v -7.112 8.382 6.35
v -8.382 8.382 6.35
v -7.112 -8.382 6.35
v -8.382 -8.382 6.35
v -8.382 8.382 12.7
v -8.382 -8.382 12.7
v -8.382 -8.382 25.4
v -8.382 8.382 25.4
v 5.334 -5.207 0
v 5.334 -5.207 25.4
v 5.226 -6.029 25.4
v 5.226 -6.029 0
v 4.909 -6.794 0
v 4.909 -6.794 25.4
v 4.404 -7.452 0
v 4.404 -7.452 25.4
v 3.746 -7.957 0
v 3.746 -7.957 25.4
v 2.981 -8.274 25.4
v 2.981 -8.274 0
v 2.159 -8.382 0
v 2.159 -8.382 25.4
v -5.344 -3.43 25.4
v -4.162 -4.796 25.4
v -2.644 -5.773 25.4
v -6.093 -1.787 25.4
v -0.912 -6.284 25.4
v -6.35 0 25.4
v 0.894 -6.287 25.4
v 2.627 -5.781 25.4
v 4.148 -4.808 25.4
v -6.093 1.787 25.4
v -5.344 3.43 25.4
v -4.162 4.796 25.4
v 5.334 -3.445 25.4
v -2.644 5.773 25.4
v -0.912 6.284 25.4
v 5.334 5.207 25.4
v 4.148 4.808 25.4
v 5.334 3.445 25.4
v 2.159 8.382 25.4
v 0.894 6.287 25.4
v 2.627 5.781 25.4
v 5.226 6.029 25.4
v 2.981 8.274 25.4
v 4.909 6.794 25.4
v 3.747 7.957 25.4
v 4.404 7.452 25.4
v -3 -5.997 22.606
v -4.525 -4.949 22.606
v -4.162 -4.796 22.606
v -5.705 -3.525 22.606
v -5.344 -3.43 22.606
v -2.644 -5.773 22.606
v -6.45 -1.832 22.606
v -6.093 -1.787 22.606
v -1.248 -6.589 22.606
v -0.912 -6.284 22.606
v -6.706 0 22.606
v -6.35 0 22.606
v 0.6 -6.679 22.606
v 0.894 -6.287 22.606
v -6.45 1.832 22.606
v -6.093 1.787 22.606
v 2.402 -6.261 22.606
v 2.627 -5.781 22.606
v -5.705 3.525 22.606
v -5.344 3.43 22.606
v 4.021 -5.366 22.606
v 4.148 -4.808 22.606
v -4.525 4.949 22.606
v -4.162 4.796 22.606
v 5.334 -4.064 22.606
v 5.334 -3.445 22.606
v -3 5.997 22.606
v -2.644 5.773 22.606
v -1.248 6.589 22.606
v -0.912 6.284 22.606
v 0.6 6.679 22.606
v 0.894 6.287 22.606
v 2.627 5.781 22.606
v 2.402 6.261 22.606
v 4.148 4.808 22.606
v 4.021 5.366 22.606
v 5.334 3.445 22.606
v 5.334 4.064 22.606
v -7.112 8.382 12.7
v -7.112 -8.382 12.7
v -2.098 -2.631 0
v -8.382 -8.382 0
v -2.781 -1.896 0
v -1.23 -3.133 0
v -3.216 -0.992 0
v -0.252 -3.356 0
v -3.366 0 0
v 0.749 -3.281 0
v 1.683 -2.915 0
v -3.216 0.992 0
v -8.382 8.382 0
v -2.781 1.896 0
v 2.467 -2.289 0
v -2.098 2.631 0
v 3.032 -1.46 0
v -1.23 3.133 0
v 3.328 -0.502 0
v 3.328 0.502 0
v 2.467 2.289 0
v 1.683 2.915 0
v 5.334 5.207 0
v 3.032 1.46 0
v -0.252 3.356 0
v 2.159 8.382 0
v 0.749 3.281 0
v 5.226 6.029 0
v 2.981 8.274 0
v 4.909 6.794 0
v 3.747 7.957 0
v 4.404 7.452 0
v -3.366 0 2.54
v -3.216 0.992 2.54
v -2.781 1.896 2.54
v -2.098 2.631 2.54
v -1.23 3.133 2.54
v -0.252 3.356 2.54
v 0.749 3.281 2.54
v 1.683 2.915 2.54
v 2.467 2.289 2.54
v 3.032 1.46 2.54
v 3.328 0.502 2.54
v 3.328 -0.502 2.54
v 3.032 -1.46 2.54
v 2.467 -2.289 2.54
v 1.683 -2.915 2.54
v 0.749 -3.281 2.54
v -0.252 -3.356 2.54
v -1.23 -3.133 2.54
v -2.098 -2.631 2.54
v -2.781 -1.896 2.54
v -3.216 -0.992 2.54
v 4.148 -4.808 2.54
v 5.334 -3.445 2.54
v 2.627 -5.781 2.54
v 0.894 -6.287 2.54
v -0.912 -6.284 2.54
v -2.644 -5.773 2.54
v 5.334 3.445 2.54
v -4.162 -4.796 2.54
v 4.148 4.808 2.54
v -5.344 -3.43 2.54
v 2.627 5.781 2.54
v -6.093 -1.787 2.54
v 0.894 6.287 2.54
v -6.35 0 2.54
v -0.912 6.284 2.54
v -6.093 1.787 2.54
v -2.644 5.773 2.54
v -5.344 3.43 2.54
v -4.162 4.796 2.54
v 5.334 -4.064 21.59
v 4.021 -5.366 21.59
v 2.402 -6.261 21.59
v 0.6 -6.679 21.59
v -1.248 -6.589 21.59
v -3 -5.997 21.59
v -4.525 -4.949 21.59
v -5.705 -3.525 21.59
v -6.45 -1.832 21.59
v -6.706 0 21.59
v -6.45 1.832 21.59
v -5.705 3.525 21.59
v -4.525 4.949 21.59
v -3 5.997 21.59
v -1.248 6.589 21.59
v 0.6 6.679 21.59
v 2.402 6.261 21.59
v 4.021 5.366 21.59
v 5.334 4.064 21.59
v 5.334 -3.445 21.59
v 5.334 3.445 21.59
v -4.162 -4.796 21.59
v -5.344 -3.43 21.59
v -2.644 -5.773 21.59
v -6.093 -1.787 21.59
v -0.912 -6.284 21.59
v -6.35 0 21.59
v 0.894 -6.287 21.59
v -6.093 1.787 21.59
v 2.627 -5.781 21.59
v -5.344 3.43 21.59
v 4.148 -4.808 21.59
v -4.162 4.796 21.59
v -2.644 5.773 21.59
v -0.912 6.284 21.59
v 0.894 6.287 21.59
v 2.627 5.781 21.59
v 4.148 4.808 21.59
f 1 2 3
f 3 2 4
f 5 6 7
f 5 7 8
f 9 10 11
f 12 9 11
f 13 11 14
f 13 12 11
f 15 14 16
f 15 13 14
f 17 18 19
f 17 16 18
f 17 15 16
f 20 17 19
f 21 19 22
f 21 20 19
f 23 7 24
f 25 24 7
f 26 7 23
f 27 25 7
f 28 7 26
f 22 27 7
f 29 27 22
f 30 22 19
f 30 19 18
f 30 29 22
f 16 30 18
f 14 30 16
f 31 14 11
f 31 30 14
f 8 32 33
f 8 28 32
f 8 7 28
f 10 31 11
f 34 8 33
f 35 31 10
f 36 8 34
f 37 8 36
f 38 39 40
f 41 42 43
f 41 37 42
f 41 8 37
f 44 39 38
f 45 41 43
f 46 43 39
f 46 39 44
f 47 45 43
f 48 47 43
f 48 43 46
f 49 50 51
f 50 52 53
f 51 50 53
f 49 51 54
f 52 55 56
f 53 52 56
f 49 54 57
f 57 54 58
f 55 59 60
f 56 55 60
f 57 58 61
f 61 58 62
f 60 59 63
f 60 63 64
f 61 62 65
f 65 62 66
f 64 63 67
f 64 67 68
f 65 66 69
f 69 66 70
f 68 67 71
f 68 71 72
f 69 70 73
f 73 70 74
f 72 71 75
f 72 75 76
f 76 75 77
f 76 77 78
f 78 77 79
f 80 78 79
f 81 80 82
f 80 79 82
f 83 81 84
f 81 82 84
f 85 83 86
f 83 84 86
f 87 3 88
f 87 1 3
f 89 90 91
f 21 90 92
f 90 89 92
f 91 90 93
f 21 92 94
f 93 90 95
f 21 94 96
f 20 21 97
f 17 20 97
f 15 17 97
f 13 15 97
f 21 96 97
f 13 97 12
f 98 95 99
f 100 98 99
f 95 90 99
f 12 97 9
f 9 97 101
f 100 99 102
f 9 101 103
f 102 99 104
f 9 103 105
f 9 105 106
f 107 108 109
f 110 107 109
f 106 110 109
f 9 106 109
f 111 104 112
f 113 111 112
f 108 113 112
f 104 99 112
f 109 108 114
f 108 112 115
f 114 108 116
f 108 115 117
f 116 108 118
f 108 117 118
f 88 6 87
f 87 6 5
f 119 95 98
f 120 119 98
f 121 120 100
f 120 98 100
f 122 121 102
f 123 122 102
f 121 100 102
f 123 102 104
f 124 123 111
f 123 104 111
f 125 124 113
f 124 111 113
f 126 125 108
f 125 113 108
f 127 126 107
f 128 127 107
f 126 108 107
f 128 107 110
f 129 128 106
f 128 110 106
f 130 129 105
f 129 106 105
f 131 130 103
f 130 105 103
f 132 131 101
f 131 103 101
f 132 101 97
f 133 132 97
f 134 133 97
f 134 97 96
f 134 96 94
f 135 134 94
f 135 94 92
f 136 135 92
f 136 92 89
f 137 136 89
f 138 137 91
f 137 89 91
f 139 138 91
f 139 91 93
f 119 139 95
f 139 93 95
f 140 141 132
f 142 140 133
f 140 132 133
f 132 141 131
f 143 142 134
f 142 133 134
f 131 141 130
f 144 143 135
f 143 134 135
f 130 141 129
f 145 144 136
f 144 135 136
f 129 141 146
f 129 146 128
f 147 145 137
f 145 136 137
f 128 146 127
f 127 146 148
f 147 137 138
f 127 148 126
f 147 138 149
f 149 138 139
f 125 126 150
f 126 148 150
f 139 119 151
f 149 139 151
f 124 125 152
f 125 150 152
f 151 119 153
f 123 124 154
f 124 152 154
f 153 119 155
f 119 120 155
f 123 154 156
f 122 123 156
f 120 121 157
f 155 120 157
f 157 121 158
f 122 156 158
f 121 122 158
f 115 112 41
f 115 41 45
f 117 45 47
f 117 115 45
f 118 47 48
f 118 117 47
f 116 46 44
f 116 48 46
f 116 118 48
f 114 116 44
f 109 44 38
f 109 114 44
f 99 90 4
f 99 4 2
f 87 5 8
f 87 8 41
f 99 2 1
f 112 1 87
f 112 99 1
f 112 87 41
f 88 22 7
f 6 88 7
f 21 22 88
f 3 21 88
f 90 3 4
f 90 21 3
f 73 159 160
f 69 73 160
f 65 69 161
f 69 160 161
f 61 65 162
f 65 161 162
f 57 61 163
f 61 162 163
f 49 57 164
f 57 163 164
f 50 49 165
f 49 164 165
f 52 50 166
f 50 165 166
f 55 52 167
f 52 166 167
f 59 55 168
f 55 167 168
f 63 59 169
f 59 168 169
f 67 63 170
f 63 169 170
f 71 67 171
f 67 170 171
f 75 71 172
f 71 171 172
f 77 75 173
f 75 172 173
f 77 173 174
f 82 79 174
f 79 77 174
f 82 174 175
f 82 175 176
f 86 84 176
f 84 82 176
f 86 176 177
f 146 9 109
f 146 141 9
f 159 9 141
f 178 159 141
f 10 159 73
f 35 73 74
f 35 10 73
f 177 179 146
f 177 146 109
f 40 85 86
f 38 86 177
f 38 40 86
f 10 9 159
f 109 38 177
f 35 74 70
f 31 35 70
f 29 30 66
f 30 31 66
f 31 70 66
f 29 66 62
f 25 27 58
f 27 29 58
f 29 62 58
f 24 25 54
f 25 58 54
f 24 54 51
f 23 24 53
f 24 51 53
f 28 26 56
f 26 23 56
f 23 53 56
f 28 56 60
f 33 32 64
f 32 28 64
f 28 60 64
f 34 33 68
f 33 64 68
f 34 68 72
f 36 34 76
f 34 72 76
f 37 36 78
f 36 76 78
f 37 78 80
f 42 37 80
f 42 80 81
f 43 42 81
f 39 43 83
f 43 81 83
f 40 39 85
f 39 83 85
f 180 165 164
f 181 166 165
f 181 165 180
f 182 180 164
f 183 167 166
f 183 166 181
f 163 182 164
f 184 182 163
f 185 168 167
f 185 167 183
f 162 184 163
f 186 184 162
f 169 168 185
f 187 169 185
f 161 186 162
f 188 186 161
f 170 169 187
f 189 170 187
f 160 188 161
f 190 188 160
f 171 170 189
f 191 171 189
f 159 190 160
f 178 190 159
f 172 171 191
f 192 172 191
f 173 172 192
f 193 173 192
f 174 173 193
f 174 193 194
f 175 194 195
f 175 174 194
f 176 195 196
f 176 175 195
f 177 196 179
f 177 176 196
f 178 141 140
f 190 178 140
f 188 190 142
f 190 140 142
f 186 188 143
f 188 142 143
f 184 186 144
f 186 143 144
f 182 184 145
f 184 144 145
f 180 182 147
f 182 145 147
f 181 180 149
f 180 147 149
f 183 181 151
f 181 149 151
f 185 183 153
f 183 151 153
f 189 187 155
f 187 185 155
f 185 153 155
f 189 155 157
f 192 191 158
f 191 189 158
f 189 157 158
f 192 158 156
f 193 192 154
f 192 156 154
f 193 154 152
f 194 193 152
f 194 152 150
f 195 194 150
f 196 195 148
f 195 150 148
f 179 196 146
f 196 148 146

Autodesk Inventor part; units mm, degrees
ref_plane "YZ Plane" through (0, 0, 0) normal (1, 0, 0) x (0, 1, 0)
sketch "Sketch1" plane through (0, 0, 0) normal (0, 0, 1) x (1, 0, 0)
  circle A0 centre (0, 0) radius 6.35
  line L0 (8.382, -8.382) -> (-8.382, -8.382)
  line L1 (-8.382, -8.382) -> (-8.382, 8.382)
  line L2 (-8.382, 8.382) -> (8.382, 8.382)
  line L3 (8.382, 8.382) -> (8.382, -8.382)
  dimension "d10" = 12.7
  dimension "d11" = 2.032
  dimension "d26" = 16.764
  dimension "d28" = 0
  dimension "d29" = 8.382
  dimension "d37" = 2.032
  dimension "d38" = 2.032
  dimension "d39" = 2.032
extrude "Extrusion2" add sketch "Sketch1" along normal blind 25.4
sketch "Sketch2" plane through (-8.382, -8.382, 0) normal (-1, 0, 0) x (0, 0, 1)
  line L0 (25.4, 14.732) -> (25.4, 2.032) projected
  line L1 (0, 2.032) -> (0, 14.732) projected
  line L2 (0, 14.732) -> (25.4, 14.732) projected
  line L3 (0, 2.032) -> (25.4, 2.032) projected
  line L4 (0, 0) -> (0, 16.764) projected
  line L5 (0, 0) -> (25.4, 0) projected
  line L6 (25.4, 16.764) -> (25.4, 0) projected
  line L7 (0, 16.764) -> (25.4, 16.764) projected
  circle A0 centre (6.35, 15.748) radius 1.4224
  circle A1 centre (6.35, 1.016) radius 1.4224
  point P0 (0, 8.382)
  dimension "d17" = 2.032
  dimension "d18" = 2.8448
  dimension "d19" = 2.8448
  dimension "d20" = 1.016
  dimension "d21" = 1.016
  dimension "d22" = 6.35
  dimension "d23" = 6.35
extrude "Extrusion3" [suppressed]
sketch "Sketch3" plane through (0, 0, 0) normal (0, 0, -1) x (-1, 0, 0)
  circle A0 centre (0, 0) radius 3.3655
  circle A1 centre (0, 0) radius 6.35 projected
  dimension "d30" = 6.731
extrude "Extrusion4" add sketch "Sketch3" against normal blind 2.54
ref_plane "Work Plane1" through (0, 0, 21.59) normal (0, 0, 1) x (1, 0, 0)
sketch "Sketch4" plane through (0, 0, 21.59) normal (0, 0, 1) x (1, 0, 0)
  circle A0 centre (0, 0) radius 6.35 projected
  circle A1 centre (0, 0) radius 6.7056
  dimension "d34" = 0.3556
extrude "Extrusion5" cut sketch "Sketch4" along normal blind 1.016
sketch "Sketch5" plane through (-8.382, -8.382, 0) normal (-1, 0, 0) x (0, 0, 1)
  line L0 (0, 0) -> (0, 16.764) projected
  line L1 (0, 0) -> (25.4, 0) projected
  line L2 (25.4, 16.764) -> (25.4, 0) projected
  line L3 (0, 16.764) -> (25.4, 16.764) projected
  line L4 (25.4, 14.732) -> (25.4, 2.032) projected
  line L5 (21.59, 2.032) -> (21.59, 14.732) projected
  line L6 (2.54, 14.732) -> (2.54, 2.032) projected
  line L7 (0, 16.764) -> (25.4, 16.764) projected
  line L8 (6.35, 0) -> (12.7, 0)
  line L9 (12.7, 0) -> (12.7, 16.764)
  line L10 (12.7, 16.764) -> (6.35, 16.764)
  line L11 (6.35, 16.764) -> (6.35, 0)
  point P0 (0, 8.382)
  dimension "d40" = 6.35
  dimension "d41" = 6.35
ref_plane "Work Plane2" through (-6.35, 0, 0) normal (-1, 0, 0) x (0, -1, 0)
extrude "Extrusion6" cut sketch "Sketch5" against normal blind 1.27 contours L11 L3 L9 L1
sketch "Sketch7" plane through (0, 0, 0) normal (0, 0, -1) x (-1, 0, 0)
  line L0 (7.112, -8.382) -> (7.112, 8.382) projected
  line L1 (7.112, 8.382) -> (7.112, -8.382) projected
  point P0 (0, 0)
  dimension "d46" = 7.112
sketch "Sketch8" plane through (0, 0, 25.4) normal (0, 0, 1) x (1, 0, 0)
  circle A0 centre (0, 0) radius 6.35 projected
  circle A1 centre (0, 0) radius 6.7056 projected
  circle A2 centre (0, 0) radius 6.7056 projected
  line L0 (8.382, -8.382) -> (-8.382, -8.382) projected
  line L1 (-8.382, 8.382) -> (8.382, 8.382) projected
  line L2 (8.382, 8.382) -> (8.382, -8.382) projected
  line L3 (5.334, 8.382) -> (8.382, 8.382)
  line L4 (8.382, 8.382) -> (8.382, -8.382)
  line L5 (8.382, -8.382) -> (5.334, -8.382)
  line L6 (5.334, -8.382) -> (5.334, 8.382)
  point P0 (5.207, -8.382)
  point P1 (5.207, -8.382)
  point P2 (-5.207, -8.382)
  dimension "d50" = 3.048
extrude "Extrusion8" cut sketch "Sketch8" against normal through all contours A0 L6 | A0 L6 A1 | L6 L1 L2 L0 A1 picked at (5.5198, -0.7897) picked at (6.4961, 0.8835)
fillet "Fillet3" radius 3.175 2 edges at (5.334, -8.382, 12.7) (5.334, 8.382, 12.7)
equation "\"d37\" = d11"
equation "\"d38\" = d11"
equation "\"d39\" = d11"
equation "\"d20\" = 0.5 * d17"
equation "\"d21\" = d20"
equation "\"d23\" = d22"
properties part number "linear bearing mount" material "Aluminum 6061"
